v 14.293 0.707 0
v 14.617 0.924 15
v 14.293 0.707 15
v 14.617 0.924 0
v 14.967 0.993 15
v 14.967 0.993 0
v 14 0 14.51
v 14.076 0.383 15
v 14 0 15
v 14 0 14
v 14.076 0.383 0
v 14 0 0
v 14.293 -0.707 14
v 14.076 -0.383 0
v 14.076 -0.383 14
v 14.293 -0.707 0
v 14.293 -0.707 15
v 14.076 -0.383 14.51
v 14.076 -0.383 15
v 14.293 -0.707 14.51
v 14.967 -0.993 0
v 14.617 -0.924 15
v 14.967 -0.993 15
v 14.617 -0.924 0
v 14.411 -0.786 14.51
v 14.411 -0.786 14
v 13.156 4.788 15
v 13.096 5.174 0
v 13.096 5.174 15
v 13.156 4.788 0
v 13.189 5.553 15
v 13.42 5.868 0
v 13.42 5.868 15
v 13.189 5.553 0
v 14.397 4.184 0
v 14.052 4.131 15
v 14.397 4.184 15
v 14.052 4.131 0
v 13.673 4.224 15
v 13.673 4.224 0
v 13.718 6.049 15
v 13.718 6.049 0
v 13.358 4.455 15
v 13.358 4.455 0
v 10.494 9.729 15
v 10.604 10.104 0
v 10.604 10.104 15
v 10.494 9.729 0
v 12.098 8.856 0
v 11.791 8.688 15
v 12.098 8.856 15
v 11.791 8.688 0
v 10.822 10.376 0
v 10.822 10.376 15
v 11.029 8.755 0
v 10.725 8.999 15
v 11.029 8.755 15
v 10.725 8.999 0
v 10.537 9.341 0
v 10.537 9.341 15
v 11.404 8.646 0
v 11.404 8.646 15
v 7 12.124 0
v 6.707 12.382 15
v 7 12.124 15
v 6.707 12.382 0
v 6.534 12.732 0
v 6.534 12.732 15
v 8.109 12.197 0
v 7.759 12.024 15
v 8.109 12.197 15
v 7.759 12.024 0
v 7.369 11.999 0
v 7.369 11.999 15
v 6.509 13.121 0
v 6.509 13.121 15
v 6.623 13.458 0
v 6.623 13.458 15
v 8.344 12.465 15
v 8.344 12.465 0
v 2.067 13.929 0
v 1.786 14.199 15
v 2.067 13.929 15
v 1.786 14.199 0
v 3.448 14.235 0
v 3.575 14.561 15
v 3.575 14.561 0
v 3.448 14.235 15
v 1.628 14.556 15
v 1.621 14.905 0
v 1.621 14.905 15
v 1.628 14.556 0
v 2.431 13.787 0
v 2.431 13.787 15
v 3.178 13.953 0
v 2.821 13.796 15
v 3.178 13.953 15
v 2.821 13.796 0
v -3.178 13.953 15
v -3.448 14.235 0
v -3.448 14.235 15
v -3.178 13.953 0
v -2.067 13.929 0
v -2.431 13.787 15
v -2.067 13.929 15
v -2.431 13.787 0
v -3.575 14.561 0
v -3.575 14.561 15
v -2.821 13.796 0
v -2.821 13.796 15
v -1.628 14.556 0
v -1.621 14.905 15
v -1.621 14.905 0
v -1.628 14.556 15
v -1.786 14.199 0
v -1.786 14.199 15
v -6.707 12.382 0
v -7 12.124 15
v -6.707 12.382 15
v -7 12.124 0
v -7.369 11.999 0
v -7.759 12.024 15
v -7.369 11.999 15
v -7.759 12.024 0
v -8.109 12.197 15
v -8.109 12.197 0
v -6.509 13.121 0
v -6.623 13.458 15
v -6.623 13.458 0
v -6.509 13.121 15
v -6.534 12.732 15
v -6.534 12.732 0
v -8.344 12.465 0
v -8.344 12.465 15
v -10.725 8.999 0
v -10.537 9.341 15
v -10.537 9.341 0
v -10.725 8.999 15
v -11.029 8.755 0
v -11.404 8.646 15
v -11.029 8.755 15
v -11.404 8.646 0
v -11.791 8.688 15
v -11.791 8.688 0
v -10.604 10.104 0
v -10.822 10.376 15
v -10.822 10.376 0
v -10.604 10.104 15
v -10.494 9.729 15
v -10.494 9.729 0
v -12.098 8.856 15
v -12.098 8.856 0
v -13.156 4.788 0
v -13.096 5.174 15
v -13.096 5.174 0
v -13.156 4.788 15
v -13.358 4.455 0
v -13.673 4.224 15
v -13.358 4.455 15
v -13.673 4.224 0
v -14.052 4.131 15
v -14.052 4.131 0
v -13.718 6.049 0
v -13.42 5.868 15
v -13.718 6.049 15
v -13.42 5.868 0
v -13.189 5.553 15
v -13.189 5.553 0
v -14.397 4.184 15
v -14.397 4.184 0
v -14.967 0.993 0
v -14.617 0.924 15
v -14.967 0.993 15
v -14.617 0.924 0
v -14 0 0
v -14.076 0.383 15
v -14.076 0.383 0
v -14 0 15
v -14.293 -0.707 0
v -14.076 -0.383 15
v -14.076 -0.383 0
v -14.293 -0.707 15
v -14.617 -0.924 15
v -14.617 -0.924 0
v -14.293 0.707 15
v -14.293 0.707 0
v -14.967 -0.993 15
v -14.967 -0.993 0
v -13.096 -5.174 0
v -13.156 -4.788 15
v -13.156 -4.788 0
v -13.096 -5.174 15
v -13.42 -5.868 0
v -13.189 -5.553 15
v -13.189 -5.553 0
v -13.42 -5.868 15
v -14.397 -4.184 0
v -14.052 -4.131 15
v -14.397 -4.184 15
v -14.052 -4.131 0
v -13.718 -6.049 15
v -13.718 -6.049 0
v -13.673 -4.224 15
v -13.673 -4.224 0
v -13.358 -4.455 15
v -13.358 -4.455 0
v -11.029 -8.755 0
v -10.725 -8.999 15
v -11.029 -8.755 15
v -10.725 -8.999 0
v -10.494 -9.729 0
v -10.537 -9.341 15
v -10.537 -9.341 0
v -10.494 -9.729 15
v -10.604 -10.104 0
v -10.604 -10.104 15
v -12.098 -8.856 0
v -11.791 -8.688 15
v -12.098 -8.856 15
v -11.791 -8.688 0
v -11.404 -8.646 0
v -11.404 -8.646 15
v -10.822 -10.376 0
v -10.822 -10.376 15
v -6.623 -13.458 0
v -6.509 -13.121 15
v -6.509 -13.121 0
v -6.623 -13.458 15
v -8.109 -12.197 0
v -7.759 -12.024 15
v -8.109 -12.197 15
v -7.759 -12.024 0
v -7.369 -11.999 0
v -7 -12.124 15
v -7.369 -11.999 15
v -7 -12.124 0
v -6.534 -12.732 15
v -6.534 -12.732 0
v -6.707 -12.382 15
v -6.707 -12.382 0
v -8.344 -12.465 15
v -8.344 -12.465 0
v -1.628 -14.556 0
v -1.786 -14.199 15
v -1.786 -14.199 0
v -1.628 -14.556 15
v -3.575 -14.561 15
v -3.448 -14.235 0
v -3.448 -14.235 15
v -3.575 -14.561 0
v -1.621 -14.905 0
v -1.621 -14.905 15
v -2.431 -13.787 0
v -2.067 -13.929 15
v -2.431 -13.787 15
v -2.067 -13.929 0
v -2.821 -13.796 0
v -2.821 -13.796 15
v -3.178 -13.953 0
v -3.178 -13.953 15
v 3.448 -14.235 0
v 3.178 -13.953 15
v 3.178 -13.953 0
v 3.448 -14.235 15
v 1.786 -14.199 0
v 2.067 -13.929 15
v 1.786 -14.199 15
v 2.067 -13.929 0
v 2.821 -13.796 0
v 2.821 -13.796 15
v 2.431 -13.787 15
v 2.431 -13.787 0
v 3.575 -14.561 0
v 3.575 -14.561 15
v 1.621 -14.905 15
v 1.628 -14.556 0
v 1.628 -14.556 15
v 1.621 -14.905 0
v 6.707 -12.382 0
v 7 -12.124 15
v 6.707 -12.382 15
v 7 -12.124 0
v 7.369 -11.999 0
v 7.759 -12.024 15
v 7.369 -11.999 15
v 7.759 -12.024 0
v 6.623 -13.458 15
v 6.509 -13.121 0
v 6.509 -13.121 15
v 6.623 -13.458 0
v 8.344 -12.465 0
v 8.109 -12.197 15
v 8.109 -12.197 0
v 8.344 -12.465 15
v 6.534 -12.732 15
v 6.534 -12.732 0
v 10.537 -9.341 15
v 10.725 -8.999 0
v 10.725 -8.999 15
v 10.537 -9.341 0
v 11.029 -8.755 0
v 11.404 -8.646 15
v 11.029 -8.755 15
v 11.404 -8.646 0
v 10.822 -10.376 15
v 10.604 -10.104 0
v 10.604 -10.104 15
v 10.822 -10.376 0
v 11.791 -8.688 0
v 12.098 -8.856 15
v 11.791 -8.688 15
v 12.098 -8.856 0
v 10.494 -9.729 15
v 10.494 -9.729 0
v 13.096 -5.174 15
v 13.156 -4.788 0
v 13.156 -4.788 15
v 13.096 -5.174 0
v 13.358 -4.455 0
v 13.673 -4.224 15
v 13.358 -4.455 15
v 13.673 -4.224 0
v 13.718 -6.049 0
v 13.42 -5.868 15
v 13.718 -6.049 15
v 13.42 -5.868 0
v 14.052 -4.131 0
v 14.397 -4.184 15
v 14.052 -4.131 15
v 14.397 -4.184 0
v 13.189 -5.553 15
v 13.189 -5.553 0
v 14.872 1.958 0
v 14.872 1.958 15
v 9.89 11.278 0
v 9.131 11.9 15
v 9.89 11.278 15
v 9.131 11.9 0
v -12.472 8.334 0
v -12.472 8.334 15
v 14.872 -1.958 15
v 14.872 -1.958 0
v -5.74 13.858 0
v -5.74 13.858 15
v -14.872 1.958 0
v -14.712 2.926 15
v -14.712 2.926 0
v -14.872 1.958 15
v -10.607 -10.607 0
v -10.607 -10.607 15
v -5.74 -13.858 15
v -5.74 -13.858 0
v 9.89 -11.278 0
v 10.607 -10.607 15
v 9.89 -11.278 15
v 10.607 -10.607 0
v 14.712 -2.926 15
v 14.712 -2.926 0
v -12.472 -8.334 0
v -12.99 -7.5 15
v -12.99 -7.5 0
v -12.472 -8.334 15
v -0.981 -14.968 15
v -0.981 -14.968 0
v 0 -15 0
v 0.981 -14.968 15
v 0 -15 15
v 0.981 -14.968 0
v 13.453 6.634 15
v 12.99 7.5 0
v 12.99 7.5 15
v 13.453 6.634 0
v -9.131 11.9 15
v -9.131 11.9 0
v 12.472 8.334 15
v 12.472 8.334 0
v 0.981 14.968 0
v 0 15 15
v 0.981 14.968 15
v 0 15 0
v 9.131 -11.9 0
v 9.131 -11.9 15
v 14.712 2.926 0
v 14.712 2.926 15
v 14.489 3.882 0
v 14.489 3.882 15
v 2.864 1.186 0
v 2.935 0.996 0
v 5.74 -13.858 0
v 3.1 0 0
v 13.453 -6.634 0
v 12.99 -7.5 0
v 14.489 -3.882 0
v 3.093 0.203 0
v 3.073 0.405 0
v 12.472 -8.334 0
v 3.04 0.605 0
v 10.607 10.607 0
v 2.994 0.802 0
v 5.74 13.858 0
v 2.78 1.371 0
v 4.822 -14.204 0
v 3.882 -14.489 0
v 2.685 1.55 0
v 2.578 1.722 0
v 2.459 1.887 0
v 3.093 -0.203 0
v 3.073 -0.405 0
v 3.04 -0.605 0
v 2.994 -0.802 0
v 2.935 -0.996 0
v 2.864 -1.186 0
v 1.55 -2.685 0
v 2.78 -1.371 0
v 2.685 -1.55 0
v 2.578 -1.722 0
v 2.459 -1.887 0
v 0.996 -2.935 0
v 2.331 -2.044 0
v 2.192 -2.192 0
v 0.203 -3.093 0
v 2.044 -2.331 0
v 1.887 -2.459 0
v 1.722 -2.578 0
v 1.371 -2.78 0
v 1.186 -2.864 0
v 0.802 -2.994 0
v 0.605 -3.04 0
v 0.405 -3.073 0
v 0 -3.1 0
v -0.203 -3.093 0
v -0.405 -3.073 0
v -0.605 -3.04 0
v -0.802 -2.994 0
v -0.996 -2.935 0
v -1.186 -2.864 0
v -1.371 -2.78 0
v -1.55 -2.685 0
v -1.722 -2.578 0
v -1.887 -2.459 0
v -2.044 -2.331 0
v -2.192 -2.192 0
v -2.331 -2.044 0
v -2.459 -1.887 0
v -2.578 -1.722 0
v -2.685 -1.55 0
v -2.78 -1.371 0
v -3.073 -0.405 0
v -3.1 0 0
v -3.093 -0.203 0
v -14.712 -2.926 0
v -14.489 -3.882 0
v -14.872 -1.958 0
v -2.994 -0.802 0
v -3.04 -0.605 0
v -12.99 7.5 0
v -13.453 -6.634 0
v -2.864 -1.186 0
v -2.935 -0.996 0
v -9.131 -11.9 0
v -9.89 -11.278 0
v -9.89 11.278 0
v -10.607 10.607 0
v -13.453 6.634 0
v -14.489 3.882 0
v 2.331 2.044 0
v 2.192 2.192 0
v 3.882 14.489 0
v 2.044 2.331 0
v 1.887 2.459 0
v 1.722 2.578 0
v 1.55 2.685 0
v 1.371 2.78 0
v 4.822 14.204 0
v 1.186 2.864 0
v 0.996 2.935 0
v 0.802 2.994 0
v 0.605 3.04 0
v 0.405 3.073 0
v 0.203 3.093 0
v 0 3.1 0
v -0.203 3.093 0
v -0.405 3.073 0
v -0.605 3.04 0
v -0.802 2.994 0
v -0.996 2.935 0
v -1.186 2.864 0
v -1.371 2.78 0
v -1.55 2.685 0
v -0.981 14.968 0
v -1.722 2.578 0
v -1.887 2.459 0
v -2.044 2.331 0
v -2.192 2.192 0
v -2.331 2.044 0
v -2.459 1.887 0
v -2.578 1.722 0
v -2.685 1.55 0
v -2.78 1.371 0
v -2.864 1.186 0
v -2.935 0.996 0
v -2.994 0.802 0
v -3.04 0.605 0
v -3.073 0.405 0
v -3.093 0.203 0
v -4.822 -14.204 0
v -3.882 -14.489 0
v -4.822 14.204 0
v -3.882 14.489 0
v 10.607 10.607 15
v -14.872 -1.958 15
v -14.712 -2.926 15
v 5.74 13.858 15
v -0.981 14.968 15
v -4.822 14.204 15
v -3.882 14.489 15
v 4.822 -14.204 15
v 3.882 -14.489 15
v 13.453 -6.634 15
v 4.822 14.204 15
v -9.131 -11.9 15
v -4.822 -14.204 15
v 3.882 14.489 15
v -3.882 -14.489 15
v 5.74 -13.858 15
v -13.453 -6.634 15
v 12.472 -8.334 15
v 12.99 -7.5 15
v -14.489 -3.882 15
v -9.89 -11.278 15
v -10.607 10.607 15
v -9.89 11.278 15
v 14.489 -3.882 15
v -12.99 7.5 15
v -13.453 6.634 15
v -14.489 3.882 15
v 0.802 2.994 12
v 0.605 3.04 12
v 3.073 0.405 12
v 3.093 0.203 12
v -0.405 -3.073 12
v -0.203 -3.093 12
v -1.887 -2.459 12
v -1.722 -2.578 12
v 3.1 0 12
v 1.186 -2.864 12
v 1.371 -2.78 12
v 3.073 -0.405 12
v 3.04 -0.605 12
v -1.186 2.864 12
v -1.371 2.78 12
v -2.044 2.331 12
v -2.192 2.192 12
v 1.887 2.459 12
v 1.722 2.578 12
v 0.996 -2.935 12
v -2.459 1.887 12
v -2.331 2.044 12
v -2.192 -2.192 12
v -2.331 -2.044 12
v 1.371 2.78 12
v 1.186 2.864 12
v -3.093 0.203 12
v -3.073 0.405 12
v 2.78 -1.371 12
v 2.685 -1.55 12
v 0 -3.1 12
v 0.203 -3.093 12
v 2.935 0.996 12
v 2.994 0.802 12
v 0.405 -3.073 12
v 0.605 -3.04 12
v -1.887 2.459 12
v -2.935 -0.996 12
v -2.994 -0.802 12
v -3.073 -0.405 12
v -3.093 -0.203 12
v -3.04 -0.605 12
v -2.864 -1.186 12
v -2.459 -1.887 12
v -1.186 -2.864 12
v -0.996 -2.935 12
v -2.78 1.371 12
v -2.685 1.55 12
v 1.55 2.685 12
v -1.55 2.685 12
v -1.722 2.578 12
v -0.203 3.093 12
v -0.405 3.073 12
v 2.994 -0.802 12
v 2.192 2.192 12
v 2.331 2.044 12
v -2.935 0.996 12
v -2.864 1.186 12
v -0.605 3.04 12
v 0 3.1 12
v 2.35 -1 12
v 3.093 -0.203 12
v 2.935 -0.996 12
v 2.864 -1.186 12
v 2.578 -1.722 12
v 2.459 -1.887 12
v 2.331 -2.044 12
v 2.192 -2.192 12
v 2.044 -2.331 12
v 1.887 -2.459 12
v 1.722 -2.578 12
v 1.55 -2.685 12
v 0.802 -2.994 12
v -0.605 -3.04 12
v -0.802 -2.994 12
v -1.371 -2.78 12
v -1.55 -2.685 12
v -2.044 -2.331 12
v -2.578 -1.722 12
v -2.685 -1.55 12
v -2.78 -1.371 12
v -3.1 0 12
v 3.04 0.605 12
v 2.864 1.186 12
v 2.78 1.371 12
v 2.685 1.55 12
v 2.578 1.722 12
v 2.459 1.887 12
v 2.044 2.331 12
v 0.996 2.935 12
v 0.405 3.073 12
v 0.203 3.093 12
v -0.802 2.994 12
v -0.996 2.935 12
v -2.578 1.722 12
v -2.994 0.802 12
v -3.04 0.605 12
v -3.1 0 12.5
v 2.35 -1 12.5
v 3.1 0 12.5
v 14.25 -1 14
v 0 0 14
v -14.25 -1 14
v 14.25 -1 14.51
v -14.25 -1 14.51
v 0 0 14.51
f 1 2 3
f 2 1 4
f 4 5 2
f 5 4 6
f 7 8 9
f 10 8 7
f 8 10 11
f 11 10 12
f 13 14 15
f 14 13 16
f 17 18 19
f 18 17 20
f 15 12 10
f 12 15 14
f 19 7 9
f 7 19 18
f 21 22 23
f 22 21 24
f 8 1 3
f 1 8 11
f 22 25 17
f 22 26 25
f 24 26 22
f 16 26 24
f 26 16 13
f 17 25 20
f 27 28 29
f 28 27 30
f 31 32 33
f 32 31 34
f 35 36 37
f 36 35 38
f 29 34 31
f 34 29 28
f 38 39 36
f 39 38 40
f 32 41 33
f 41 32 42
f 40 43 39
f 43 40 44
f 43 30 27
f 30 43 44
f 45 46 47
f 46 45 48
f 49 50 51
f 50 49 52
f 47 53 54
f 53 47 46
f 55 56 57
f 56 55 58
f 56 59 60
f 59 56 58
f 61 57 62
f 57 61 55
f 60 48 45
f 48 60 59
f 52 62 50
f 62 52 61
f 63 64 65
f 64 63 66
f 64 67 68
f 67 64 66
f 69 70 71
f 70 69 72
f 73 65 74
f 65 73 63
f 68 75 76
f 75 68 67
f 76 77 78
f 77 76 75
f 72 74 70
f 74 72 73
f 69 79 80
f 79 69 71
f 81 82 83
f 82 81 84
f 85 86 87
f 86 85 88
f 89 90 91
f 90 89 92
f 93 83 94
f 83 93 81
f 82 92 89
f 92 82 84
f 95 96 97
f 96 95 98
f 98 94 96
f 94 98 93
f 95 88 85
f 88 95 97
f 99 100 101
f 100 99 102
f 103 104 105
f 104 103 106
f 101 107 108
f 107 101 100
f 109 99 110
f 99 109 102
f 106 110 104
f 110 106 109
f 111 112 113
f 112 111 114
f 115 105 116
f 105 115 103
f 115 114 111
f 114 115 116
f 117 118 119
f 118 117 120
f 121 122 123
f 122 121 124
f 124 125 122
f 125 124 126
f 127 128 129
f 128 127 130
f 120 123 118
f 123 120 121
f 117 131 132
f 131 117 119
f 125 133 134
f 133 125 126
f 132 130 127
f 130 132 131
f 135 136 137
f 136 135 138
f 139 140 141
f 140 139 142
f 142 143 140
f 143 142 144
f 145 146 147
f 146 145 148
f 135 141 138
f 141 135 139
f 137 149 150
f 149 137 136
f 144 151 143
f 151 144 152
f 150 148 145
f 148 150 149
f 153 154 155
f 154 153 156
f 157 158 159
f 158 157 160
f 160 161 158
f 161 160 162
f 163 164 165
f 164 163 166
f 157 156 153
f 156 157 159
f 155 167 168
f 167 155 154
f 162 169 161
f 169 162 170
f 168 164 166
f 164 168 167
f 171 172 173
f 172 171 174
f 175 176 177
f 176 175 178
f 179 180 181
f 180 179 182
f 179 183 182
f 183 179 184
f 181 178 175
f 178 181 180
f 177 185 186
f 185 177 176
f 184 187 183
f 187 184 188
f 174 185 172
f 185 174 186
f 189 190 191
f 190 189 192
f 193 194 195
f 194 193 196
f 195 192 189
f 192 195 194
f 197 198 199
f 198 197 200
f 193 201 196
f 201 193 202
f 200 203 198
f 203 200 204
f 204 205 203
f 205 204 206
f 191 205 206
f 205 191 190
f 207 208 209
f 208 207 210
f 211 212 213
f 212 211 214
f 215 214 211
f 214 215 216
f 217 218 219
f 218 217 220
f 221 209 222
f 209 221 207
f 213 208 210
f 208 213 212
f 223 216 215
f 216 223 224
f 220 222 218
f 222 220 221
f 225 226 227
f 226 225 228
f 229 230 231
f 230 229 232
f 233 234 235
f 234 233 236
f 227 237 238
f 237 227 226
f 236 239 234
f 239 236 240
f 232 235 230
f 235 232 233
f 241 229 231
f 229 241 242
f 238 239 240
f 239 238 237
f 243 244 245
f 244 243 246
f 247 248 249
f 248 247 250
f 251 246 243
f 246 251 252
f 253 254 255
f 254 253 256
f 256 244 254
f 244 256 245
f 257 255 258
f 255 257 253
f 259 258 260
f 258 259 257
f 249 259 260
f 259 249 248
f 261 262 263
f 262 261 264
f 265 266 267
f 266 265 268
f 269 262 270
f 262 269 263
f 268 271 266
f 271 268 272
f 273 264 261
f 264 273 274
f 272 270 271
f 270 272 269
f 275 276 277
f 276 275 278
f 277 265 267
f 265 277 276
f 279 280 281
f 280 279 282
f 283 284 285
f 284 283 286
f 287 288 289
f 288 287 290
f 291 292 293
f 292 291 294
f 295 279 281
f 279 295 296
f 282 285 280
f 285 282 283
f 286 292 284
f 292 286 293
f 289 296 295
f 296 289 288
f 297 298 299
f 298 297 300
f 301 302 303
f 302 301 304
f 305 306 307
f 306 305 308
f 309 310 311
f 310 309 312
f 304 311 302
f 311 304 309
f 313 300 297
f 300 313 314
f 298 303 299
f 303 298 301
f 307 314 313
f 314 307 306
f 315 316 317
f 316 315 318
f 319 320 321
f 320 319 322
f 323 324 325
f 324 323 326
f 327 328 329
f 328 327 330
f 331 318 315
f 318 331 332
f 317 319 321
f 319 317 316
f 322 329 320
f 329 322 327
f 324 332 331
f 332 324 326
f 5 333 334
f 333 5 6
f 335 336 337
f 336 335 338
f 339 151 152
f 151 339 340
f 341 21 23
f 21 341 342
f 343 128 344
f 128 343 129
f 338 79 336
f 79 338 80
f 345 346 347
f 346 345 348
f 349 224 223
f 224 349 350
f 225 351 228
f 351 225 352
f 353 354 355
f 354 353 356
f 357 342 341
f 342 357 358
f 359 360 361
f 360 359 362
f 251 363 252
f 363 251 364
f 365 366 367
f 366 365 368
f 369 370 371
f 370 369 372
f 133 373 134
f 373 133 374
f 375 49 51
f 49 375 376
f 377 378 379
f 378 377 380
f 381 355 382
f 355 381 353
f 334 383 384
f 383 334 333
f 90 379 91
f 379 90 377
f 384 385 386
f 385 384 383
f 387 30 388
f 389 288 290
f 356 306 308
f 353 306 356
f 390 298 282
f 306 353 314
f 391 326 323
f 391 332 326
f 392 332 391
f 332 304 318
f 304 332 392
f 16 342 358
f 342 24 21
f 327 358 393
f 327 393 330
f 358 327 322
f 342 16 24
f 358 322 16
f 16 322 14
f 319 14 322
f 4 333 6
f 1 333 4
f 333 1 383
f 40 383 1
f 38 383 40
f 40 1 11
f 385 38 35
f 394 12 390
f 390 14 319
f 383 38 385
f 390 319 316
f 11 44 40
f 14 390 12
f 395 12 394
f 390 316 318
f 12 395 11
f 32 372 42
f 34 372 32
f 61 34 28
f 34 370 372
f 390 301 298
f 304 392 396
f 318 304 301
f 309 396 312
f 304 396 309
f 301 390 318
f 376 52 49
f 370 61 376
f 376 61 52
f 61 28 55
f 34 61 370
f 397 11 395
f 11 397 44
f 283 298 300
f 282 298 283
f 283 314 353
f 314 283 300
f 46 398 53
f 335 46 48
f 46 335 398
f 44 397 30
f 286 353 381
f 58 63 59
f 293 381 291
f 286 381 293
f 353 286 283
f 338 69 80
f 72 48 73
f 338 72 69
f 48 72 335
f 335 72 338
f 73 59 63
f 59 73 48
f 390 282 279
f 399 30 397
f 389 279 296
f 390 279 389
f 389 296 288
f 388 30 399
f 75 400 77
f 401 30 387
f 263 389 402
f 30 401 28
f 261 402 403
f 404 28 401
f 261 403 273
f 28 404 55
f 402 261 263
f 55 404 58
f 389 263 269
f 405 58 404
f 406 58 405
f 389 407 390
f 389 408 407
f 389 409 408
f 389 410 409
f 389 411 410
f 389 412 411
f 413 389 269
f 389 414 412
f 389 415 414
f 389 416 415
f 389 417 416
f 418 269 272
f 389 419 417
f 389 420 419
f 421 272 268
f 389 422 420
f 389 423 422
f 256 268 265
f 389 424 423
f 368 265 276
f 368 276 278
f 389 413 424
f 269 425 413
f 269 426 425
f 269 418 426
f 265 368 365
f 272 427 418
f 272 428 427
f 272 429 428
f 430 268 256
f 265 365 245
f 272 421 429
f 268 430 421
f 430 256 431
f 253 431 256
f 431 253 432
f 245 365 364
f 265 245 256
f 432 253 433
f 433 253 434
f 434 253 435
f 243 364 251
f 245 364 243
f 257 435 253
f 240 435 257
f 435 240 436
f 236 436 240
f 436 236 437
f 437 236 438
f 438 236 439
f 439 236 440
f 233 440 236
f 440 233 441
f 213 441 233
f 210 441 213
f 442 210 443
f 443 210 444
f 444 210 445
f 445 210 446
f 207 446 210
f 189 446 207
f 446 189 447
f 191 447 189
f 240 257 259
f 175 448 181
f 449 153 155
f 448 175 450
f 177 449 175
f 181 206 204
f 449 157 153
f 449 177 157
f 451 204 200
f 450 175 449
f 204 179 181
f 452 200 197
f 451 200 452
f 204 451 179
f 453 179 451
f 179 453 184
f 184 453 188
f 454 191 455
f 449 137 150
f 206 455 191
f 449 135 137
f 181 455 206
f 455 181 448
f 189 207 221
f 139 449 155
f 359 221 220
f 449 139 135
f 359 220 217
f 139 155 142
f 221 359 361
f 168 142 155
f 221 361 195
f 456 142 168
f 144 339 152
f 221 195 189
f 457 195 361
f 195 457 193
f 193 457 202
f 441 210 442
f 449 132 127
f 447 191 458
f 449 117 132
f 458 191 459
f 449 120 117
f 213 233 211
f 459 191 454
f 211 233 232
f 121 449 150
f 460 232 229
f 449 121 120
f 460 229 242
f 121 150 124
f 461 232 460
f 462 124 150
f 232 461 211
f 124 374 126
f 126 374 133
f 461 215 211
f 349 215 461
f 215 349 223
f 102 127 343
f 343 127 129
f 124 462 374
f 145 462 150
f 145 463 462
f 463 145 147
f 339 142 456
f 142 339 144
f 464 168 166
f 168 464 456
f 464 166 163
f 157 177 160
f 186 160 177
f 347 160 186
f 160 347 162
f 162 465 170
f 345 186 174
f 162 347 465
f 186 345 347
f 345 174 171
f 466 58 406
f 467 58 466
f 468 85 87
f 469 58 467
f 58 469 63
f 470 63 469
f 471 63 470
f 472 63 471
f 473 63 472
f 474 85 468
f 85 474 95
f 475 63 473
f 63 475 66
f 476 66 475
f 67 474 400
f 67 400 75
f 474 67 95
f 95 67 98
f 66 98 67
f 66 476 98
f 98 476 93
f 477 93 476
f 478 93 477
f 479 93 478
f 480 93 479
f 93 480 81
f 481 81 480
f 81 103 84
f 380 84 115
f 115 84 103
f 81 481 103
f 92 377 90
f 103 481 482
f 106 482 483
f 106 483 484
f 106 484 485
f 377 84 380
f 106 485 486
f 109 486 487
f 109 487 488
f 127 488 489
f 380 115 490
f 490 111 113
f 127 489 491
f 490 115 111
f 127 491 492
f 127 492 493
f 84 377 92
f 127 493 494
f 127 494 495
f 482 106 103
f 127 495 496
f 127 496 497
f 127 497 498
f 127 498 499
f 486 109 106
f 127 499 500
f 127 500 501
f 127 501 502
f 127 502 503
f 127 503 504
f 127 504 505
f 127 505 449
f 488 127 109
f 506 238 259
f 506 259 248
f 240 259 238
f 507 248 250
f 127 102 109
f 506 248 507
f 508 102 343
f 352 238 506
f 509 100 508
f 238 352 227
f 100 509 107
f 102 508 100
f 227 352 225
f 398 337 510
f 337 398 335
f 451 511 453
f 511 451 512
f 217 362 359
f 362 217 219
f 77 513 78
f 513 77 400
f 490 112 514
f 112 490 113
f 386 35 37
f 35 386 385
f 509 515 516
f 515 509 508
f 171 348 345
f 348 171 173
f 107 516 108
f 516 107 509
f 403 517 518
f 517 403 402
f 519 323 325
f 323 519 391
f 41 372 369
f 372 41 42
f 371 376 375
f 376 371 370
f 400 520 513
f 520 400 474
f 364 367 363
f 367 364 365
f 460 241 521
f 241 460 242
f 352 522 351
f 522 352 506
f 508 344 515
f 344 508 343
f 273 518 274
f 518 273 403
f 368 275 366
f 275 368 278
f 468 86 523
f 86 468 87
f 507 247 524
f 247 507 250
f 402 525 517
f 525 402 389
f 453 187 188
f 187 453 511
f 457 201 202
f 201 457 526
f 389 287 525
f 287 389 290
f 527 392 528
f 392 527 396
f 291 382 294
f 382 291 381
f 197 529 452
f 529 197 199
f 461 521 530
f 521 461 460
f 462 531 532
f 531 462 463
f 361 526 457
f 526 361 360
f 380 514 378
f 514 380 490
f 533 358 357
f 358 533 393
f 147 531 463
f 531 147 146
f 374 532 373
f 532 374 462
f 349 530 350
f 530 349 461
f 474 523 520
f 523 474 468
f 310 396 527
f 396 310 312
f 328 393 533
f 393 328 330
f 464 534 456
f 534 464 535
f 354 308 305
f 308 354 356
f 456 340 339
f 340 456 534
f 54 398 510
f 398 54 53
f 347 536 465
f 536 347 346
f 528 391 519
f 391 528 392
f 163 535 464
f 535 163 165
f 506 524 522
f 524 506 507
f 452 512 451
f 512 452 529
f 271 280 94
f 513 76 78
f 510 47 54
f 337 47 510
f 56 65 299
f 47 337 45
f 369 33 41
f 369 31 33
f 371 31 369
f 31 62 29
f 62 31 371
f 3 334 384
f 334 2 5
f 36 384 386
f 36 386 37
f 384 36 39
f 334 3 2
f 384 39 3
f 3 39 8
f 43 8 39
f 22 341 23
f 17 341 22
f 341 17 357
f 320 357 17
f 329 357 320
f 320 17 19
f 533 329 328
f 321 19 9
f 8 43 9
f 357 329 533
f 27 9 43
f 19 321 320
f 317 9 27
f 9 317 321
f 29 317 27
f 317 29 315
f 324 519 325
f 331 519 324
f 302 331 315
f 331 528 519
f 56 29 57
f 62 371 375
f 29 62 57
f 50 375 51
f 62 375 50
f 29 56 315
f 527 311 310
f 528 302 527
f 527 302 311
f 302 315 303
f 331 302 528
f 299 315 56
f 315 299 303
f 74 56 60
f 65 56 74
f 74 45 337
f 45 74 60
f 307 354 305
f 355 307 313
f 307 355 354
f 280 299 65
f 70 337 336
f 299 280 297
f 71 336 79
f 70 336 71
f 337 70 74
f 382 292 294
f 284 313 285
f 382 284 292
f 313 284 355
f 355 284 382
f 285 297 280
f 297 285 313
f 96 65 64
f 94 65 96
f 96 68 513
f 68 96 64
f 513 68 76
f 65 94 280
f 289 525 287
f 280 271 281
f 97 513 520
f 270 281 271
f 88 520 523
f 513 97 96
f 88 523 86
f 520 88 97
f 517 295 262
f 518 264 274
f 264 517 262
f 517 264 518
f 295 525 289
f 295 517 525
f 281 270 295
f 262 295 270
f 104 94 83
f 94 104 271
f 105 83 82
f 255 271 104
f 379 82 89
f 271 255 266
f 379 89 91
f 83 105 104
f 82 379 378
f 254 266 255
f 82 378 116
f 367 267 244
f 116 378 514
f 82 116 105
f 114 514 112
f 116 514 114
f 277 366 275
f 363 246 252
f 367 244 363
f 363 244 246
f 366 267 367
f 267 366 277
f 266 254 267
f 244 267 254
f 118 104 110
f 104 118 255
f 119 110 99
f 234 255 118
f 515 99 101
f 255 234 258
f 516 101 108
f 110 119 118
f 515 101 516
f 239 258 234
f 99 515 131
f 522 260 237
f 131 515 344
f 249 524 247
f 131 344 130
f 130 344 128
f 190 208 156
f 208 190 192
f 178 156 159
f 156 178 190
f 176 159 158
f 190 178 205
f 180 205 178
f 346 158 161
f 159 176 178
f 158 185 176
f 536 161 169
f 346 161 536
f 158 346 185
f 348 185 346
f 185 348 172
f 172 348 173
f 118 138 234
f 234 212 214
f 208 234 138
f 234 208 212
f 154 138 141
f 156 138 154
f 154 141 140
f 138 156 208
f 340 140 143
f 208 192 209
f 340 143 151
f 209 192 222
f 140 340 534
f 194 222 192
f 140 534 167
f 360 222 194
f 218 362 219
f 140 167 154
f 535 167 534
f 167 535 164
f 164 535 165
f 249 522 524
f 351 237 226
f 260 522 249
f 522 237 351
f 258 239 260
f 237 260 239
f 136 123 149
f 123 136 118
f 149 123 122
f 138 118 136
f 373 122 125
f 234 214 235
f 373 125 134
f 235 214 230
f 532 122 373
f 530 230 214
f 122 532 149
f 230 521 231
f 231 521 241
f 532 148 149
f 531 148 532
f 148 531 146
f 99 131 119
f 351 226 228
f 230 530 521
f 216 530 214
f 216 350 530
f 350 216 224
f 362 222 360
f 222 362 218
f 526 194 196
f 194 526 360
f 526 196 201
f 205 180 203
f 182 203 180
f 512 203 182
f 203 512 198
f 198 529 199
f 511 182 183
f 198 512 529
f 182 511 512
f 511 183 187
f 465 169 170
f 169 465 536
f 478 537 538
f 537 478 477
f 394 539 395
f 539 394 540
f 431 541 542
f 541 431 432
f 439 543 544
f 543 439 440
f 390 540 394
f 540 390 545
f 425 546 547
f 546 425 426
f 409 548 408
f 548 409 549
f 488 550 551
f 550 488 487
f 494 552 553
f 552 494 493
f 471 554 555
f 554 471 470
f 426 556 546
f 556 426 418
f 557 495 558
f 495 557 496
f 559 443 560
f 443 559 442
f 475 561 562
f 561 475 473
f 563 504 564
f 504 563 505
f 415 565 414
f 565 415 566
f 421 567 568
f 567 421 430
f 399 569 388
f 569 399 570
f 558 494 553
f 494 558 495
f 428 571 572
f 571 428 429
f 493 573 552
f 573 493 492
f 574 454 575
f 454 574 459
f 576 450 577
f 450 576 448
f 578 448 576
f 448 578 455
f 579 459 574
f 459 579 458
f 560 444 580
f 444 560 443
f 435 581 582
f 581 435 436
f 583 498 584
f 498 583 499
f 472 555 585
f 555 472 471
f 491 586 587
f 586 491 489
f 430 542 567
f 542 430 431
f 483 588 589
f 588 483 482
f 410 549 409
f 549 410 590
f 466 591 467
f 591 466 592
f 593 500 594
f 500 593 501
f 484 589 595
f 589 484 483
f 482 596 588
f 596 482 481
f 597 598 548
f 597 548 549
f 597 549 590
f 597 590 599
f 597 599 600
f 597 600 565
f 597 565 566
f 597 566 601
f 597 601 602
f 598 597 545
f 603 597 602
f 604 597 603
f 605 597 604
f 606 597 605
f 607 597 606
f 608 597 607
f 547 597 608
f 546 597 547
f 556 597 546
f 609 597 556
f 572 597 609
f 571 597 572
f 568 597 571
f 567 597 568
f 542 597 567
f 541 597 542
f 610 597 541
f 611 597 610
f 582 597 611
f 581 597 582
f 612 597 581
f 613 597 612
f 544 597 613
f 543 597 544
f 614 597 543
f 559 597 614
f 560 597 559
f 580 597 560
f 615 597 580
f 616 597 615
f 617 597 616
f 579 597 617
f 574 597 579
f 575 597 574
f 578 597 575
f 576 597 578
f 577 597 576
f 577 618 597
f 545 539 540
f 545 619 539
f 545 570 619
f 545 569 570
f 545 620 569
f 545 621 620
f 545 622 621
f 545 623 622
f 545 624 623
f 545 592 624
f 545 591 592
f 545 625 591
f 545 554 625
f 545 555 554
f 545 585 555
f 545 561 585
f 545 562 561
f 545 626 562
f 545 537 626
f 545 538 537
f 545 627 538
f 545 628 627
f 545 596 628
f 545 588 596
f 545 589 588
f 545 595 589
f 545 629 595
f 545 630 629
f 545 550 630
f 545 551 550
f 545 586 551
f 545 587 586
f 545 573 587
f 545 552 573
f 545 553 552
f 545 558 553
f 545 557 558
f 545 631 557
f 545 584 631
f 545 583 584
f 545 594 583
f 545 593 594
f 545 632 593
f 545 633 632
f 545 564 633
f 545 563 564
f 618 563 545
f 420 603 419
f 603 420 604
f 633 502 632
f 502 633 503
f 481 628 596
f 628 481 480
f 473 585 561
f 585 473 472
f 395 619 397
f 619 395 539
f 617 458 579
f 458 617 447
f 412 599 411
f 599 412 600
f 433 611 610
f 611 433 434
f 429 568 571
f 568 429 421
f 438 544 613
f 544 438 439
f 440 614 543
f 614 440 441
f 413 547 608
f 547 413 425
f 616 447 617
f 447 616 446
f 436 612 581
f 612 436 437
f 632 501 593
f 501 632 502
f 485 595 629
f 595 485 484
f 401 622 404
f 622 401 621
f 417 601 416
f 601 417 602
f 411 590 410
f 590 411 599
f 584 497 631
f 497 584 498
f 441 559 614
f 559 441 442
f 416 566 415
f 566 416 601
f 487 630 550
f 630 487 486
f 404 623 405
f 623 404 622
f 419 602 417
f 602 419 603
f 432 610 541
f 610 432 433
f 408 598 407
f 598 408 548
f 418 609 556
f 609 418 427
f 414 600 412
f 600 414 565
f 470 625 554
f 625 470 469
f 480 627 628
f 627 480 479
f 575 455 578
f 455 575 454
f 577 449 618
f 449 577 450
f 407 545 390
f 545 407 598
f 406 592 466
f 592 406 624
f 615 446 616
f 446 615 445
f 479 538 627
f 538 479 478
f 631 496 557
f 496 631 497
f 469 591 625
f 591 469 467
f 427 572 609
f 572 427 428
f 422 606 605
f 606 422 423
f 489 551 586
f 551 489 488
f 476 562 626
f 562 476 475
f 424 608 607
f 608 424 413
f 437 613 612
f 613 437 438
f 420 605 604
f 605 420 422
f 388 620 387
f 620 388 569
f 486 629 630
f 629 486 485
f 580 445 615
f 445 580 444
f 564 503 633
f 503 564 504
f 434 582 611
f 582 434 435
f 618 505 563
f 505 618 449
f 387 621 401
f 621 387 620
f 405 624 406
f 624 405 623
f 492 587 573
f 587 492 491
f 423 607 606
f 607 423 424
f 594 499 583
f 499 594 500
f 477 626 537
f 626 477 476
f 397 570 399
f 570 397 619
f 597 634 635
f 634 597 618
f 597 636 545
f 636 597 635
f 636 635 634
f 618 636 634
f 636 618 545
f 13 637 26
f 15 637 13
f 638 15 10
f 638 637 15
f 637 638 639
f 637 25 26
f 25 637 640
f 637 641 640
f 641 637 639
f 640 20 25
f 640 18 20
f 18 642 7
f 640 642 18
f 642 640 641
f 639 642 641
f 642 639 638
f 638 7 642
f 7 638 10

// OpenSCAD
// Replacement knob for a hotplate stirrer with a 6 mm D-shaft
// Print orientation: bottom face (with D-bore) on the bed at z = 0

// ---------------- Parameters ----------------
knob_d        = 30;    // knob outer diameter
knob_h        = 15;    // knob height
shaft_d       = 6.2;   // D-shaft diameter (bore circle diameter)
bore_depth    = 12;    // blind bore depth from bottom face
bore_flat     = 4.7;   // distance from D-flat to opposite side of circle
groove_count  = 18;    // number of vertical grip grooves
groove_d      = 2;     // groove diameter (half-cylinder)
pointer_w     = 1.5;   // pointer groove width
pointer_depth = 1;     // pointer groove depth
eps           = 0.5;   // overcut so cutting faces are not coplanar

$fn = 96;

// ---------------- Model ----------------
difference() {
    // Main body
    cylinder(d = knob_d, h = knob_h);

    // D-shaped blind bore from the bottom face
    translate([0, 0, -eps])
        linear_extrude(height = bore_depth + eps)
            circle(d = shaft_d);
    // Flat on the D: remove the segment above the 4.7 mm chord
    translate([0, 0, bore_depth])
        linear_extrude(height = eps)
            polygon([
                [-(shaft_d / 2), 0],
                [ shaft_d / 2, 0],
                [ bore_flat / 2, -pointer_depth]
            ]);

    // Vertical grip grooves around the outside, full height
    for (i = [0 : groove_count - 1])
        rotate([0, 0, i * 360 / groove_count])
            translate([knob_d / 2, 0, -eps])
                cylinder(d = groove_d, h = knob_h + 2 * eps, $fn = 16);

    // Pointer groove on the top face, from centre to outer edge
    translate([0, 0, knob_h - pointer_depth])
        linear_extrude(height = eps + 0.01)
            polygon([
                [0, 0],
                [knob_d / 2, 0],
                [knob_d / 2 - pointer_w / 2, -pointer_depth],
                [-(knob_d / 2 - pointer_w / 2), -pointer_depth]
            ]);
}
